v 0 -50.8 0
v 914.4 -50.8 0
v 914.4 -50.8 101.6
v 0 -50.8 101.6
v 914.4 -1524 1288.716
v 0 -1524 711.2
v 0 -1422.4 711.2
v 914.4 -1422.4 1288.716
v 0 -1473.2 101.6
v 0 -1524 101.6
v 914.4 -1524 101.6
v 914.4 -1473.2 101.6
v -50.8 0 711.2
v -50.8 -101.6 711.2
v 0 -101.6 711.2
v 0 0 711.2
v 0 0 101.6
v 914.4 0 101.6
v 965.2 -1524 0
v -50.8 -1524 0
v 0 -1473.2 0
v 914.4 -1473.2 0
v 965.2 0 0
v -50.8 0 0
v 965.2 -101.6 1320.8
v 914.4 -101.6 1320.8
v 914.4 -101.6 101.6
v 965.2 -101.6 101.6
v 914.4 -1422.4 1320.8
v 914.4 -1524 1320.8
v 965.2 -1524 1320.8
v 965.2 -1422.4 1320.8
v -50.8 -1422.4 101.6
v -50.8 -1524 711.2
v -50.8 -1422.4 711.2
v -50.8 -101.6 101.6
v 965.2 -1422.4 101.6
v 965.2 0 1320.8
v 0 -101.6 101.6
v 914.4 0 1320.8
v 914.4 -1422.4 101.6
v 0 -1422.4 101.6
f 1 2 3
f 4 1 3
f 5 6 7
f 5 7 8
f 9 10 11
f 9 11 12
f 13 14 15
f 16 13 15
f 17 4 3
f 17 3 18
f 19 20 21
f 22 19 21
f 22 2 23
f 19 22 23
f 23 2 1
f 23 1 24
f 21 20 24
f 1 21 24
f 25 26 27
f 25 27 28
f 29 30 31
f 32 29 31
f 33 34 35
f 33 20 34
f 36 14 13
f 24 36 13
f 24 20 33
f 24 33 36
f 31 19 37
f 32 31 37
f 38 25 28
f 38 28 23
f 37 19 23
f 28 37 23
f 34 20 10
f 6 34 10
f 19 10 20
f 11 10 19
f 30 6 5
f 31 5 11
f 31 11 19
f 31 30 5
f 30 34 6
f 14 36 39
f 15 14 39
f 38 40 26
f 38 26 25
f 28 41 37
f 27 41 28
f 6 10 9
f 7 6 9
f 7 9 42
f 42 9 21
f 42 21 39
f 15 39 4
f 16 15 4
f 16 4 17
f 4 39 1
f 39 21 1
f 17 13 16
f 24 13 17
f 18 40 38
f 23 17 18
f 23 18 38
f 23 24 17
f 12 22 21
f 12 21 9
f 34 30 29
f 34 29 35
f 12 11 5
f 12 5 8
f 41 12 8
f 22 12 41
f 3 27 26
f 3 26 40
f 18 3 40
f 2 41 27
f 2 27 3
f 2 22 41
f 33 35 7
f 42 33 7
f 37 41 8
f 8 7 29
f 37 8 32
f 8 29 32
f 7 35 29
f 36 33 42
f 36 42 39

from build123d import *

# Parameters (mm, degrees)
F0_W      = 50.8
F0_H      = 101.6
F1_DEPTH  = 1524
F2_W      = 50.8
F2_H      = 101.6
F3_DEPTH  = 914.4
F4_W      = 50.8
F4_H      = 101.6
F5_DEPTH  = 1524
F6_W      = 50.8
F6_H      = 101.6
F7_DEPTH  = 914.4
F8_W      = 50.8
F8_H      = 101.6
F9_DEPTH  = 1219.2
F10_W     = 50.8
F10_H     = 101.6
F11_DEPTH = 1219.2
F12_W     = 50.8
F12_H     = 101.6
F13_DEPTH = 609.6
F14_W     = 50.8
F14_H     = 101.6
F15_DEPTH = 609.6
F17_DEPTH = 101.6


with BuildPart() as f1:
    # F0 (on Front) → F1 (new body)
    with BuildSketch(Plane.XZ):
        with Locations((-25.4, 50.8)):
            Rectangle(F0_W, F0_H)
    extrude(amount=F1_DEPTH)

    # F2 (on Right) → F3 (join)
    with BuildSketch(Plane.YZ):
        with Locations((-25.4, 50.8)):
            Rectangle(F2_W, F2_H)
    extrude(amount=F3_DEPTH)

    # F4 (on face) → F5 (join)
    with BuildSketch(Plane(origin=(0, 0, 0), x_dir=(-1, 0, 0), z_dir=(0, 1, 0))):
        with Locations((-939.8, 50.8)):
            Rectangle(F4_W, F4_H)
    extrude(amount=-F5_DEPTH)

    # F6 (on face) → F7 (join)
    with BuildSketch(Plane.YZ):
        with Locations((-1498.6, 50.8)):
            Rectangle(F6_W, F6_H)
    extrude(amount=F7_DEPTH)

    # F8 (on face) → F9 (join)
    with BuildSketch(Plane.XY.offset(101.6)):
        with Locations((939.8, -1473.2)):
            Rectangle(F8_W, F8_H)
    extrude(amount=F9_DEPTH)

    # F10 (on face) → F11 (join)
    with BuildSketch(Plane.XY.offset(101.6)):
        with Locations((939.8, -50.8)):
            Rectangle(F10_W, F10_H)
    extrude(amount=F11_DEPTH)

    # F12 (on face) → F13 (join)
    with BuildSketch(Plane.XY.offset(101.6)):
        with Locations((-25.4, -50.8)):
            Rectangle(F12_W, F12_H)
    extrude(amount=F13_DEPTH)

    # F14 (on face) → F15 (join)
    with BuildSketch(Plane.XY.offset(101.6)):
        with Locations((-25.4, -1473.2)):
            Rectangle(F14_W, F14_H)
    extrude(amount=F15_DEPTH)

    # F16 (on face) → F17 (join)
    with BuildSketch(Plane.XZ.offset(1524)):
        Polygon((914.4, 1320.8), (-50.8, 711.2), (0, 711.2), (914.4, 1288.715789), align=None)
    extrude(amount=-F17_DEPTH)


solid = f1.part
